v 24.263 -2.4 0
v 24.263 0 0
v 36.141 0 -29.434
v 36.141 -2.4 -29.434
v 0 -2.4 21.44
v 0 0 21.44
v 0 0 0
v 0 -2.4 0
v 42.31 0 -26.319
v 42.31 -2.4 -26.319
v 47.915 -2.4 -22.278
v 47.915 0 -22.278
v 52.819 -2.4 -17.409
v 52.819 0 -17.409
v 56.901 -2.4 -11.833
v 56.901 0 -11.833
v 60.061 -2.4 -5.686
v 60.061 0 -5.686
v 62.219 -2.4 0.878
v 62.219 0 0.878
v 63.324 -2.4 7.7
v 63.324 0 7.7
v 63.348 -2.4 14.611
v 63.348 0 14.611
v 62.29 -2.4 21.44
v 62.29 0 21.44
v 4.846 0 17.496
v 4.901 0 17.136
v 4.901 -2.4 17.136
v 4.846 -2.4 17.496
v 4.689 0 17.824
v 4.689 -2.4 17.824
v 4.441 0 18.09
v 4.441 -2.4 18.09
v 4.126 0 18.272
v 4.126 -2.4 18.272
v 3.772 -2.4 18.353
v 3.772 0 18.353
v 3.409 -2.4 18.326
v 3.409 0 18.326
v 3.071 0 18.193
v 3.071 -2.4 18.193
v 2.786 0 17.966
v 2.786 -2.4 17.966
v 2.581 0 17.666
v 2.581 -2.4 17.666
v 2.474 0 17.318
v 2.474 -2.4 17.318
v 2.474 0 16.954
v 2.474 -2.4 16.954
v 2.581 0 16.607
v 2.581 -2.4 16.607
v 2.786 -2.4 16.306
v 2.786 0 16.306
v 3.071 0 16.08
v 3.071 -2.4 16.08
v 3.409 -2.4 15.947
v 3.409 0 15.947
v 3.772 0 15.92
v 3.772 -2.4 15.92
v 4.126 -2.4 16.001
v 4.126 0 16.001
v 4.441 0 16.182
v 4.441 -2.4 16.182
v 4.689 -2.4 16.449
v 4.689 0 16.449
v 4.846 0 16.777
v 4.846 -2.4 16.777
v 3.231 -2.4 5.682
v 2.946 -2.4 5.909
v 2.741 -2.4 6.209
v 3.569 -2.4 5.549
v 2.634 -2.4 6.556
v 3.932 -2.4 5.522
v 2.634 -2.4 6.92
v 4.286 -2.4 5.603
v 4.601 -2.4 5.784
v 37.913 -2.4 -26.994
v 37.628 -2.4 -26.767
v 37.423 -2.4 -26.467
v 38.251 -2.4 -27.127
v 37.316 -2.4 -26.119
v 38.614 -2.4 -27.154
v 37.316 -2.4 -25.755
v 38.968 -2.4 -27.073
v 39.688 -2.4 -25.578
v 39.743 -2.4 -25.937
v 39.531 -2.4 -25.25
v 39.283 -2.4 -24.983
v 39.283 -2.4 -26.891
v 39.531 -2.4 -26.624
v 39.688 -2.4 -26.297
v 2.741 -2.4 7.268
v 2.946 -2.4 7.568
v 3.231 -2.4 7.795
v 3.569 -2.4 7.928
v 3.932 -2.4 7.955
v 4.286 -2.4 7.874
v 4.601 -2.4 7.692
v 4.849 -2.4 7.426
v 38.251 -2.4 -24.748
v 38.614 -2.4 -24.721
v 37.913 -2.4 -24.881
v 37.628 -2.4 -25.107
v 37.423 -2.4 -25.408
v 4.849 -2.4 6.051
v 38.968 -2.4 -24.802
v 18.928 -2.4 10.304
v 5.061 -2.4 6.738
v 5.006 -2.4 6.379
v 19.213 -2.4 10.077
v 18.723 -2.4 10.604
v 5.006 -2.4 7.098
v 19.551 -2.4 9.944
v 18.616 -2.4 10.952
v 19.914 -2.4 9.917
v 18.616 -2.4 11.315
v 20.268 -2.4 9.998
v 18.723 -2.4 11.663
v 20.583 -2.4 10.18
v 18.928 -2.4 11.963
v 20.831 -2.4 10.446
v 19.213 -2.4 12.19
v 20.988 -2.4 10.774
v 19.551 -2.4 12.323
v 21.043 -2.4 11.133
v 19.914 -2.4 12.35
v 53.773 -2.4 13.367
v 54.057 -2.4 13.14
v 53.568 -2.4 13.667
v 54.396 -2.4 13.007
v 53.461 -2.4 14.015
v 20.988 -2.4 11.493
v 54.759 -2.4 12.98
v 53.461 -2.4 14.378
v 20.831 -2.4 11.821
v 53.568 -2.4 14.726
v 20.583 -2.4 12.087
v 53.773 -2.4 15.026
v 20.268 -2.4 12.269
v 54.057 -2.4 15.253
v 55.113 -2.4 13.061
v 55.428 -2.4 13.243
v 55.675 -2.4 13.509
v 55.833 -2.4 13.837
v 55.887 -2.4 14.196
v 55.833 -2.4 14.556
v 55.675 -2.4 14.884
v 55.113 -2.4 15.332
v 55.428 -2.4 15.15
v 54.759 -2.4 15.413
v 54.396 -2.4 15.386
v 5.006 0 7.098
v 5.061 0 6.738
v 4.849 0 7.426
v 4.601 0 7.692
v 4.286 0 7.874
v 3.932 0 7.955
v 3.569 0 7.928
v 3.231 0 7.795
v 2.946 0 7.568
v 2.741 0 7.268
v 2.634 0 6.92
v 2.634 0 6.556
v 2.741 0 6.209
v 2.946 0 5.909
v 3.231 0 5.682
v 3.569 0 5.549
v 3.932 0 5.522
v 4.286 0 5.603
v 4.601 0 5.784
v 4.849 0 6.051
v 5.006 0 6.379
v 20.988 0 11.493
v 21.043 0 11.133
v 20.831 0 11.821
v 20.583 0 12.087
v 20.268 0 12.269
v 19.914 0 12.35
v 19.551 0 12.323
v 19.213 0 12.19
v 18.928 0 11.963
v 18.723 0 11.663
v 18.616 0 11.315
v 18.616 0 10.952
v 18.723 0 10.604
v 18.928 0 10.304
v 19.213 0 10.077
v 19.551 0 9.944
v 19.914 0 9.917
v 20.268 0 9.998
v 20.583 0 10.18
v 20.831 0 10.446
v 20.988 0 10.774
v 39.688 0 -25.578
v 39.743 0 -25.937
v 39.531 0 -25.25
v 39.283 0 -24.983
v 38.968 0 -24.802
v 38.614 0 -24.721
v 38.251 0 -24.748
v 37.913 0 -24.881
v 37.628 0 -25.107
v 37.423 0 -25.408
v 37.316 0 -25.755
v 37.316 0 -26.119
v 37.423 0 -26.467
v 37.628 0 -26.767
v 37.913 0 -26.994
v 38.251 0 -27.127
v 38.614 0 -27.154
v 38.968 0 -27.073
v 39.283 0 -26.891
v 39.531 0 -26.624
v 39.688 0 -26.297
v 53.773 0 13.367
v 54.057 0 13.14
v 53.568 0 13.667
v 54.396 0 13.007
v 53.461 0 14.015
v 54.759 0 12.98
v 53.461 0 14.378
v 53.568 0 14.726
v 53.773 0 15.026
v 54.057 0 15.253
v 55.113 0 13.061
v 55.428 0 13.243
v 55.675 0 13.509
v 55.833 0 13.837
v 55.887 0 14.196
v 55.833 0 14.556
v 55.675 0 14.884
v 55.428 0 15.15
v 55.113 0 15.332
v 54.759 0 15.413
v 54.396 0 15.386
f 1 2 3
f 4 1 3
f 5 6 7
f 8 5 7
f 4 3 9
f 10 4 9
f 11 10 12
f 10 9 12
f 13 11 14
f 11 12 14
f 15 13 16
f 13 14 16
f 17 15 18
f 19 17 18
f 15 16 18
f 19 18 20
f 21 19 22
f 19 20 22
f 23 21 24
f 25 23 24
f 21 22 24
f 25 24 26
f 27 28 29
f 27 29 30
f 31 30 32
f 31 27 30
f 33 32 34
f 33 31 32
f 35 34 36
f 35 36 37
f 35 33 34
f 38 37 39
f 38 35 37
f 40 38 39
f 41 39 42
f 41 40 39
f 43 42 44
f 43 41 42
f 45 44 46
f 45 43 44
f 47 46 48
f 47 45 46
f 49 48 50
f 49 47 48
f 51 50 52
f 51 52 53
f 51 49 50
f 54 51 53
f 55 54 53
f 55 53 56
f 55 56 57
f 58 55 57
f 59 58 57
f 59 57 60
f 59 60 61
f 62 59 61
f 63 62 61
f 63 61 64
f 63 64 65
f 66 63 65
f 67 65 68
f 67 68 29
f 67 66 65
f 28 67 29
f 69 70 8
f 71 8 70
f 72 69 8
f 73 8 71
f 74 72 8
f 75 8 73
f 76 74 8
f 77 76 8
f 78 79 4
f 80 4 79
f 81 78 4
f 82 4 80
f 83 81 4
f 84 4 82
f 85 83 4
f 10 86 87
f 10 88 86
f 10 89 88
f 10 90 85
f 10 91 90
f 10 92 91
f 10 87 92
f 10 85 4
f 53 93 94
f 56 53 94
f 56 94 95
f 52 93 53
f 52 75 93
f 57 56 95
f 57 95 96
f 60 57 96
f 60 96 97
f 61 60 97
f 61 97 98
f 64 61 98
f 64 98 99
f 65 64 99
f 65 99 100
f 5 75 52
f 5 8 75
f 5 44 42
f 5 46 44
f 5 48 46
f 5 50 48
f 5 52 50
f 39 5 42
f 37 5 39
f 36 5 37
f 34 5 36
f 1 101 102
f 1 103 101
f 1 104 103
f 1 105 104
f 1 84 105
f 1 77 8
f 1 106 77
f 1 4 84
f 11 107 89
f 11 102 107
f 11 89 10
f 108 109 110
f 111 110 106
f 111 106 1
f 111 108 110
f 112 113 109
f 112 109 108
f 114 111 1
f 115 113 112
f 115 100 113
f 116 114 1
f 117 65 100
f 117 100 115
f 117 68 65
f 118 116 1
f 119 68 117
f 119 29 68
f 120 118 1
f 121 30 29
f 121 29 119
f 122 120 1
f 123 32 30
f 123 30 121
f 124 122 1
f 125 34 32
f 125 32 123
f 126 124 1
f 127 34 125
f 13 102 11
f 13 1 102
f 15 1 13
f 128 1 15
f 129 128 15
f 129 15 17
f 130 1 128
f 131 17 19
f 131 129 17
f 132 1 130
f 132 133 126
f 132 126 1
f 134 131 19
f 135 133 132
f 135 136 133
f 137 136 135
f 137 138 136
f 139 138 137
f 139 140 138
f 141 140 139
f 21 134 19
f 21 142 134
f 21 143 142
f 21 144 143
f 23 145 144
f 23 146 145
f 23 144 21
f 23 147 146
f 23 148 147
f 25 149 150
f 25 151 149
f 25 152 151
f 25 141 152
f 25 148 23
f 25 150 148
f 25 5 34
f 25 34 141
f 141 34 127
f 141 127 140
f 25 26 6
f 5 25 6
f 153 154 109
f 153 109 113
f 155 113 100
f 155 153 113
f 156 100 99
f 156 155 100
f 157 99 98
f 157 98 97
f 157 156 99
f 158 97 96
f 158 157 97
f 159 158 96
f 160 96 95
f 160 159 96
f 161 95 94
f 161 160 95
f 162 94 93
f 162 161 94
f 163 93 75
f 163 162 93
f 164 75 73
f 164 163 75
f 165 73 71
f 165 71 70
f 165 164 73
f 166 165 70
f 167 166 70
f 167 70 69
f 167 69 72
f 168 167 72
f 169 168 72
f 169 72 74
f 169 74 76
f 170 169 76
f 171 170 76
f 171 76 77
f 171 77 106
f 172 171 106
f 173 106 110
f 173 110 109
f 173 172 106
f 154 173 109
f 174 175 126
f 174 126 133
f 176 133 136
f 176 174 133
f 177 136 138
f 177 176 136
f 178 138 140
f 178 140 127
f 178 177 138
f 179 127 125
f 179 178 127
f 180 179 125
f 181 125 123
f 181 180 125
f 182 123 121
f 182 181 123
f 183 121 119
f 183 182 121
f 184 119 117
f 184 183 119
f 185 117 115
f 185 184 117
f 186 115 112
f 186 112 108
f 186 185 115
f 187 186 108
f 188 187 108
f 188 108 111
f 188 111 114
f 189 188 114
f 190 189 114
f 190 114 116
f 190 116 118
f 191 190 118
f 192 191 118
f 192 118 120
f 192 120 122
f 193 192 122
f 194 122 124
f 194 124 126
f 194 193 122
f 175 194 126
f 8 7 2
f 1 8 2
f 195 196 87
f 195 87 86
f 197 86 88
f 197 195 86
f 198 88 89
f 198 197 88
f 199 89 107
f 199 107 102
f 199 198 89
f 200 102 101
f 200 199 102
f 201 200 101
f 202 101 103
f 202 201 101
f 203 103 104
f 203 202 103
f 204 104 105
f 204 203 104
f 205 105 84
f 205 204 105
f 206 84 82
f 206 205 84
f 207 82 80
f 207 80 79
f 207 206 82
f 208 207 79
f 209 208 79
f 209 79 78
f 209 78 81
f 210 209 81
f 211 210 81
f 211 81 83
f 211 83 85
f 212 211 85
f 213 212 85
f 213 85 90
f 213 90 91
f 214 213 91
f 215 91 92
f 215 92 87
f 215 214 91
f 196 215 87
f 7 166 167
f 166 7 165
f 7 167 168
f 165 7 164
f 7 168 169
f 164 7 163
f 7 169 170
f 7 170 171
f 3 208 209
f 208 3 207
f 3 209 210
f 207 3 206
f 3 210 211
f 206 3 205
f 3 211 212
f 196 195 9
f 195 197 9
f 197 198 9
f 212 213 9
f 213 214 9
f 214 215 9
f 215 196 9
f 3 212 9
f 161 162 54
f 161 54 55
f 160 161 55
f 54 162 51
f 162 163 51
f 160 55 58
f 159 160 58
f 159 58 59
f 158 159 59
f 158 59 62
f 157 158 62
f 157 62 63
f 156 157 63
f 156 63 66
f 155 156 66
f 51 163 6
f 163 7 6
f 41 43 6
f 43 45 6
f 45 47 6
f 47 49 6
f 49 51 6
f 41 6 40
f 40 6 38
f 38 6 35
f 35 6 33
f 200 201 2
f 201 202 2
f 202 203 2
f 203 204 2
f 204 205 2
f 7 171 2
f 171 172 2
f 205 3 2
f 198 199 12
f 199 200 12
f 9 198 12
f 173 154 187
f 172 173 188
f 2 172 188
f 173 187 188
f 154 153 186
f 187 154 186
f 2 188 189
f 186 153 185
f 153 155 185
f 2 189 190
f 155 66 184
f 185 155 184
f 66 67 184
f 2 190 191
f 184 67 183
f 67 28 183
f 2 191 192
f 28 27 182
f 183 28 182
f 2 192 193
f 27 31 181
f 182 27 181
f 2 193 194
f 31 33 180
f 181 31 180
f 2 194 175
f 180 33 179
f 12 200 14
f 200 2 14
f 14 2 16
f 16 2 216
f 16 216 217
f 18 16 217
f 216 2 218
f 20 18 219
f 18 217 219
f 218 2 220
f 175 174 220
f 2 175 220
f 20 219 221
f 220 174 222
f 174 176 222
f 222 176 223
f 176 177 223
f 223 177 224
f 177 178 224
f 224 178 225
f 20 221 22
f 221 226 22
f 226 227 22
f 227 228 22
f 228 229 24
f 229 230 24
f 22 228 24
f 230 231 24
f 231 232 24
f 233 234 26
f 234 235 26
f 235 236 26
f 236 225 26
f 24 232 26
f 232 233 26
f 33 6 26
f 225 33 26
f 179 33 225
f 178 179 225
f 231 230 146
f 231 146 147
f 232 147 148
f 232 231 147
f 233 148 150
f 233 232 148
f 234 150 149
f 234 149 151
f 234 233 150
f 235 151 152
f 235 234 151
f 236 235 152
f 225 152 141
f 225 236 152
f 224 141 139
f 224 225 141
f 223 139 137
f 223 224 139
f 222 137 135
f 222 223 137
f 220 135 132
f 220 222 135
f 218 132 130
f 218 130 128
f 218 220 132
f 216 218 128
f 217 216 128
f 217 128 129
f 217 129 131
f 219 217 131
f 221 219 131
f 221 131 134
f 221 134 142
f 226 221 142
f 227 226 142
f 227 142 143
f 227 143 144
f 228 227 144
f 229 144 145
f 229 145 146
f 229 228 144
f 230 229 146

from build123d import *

# Parameters (mm, degrees)
F0_R     = 1.22
F1_DEPTH = 2.4


with BuildPart() as f1:
    # F0 (on Front) → F1 (new body)
    with BuildSketch(Plane.XZ):
        with BuildLine():
            Line((62.29, 21.44), (0, 21.44))
            Line((0, 21.44), (0, 0))
            Line((0, 0), (24.263217, 0))
            Line((24.263217, 0), (36.140737, -29.43386))
            ThreePointArc((36.140737, -29.43386), (58.601735, -8.82154), (62.29, 21.44))
        make_face()
        with Locations((38.522564, -25.937207)):
            Circle(F0_R, mode=Mode.SUBTRACT)
        with Locations((3.840634, 6.738324)):
            Circle(F0_R, mode=Mode.SUBTRACT)
        with Locations((3.680635, 17.136306)):
            Circle(F0_R, mode=Mode.SUBTRACT)
        with Locations((19.822557, 11.133424)):
            Circle(F0_R, mode=Mode.SUBTRACT)
        with Locations((54.667417, 14.196431)):
            Circle(F0_R, mode=Mode.SUBTRACT)
    extrude(amount=F1_DEPTH)


solid = f1.part
